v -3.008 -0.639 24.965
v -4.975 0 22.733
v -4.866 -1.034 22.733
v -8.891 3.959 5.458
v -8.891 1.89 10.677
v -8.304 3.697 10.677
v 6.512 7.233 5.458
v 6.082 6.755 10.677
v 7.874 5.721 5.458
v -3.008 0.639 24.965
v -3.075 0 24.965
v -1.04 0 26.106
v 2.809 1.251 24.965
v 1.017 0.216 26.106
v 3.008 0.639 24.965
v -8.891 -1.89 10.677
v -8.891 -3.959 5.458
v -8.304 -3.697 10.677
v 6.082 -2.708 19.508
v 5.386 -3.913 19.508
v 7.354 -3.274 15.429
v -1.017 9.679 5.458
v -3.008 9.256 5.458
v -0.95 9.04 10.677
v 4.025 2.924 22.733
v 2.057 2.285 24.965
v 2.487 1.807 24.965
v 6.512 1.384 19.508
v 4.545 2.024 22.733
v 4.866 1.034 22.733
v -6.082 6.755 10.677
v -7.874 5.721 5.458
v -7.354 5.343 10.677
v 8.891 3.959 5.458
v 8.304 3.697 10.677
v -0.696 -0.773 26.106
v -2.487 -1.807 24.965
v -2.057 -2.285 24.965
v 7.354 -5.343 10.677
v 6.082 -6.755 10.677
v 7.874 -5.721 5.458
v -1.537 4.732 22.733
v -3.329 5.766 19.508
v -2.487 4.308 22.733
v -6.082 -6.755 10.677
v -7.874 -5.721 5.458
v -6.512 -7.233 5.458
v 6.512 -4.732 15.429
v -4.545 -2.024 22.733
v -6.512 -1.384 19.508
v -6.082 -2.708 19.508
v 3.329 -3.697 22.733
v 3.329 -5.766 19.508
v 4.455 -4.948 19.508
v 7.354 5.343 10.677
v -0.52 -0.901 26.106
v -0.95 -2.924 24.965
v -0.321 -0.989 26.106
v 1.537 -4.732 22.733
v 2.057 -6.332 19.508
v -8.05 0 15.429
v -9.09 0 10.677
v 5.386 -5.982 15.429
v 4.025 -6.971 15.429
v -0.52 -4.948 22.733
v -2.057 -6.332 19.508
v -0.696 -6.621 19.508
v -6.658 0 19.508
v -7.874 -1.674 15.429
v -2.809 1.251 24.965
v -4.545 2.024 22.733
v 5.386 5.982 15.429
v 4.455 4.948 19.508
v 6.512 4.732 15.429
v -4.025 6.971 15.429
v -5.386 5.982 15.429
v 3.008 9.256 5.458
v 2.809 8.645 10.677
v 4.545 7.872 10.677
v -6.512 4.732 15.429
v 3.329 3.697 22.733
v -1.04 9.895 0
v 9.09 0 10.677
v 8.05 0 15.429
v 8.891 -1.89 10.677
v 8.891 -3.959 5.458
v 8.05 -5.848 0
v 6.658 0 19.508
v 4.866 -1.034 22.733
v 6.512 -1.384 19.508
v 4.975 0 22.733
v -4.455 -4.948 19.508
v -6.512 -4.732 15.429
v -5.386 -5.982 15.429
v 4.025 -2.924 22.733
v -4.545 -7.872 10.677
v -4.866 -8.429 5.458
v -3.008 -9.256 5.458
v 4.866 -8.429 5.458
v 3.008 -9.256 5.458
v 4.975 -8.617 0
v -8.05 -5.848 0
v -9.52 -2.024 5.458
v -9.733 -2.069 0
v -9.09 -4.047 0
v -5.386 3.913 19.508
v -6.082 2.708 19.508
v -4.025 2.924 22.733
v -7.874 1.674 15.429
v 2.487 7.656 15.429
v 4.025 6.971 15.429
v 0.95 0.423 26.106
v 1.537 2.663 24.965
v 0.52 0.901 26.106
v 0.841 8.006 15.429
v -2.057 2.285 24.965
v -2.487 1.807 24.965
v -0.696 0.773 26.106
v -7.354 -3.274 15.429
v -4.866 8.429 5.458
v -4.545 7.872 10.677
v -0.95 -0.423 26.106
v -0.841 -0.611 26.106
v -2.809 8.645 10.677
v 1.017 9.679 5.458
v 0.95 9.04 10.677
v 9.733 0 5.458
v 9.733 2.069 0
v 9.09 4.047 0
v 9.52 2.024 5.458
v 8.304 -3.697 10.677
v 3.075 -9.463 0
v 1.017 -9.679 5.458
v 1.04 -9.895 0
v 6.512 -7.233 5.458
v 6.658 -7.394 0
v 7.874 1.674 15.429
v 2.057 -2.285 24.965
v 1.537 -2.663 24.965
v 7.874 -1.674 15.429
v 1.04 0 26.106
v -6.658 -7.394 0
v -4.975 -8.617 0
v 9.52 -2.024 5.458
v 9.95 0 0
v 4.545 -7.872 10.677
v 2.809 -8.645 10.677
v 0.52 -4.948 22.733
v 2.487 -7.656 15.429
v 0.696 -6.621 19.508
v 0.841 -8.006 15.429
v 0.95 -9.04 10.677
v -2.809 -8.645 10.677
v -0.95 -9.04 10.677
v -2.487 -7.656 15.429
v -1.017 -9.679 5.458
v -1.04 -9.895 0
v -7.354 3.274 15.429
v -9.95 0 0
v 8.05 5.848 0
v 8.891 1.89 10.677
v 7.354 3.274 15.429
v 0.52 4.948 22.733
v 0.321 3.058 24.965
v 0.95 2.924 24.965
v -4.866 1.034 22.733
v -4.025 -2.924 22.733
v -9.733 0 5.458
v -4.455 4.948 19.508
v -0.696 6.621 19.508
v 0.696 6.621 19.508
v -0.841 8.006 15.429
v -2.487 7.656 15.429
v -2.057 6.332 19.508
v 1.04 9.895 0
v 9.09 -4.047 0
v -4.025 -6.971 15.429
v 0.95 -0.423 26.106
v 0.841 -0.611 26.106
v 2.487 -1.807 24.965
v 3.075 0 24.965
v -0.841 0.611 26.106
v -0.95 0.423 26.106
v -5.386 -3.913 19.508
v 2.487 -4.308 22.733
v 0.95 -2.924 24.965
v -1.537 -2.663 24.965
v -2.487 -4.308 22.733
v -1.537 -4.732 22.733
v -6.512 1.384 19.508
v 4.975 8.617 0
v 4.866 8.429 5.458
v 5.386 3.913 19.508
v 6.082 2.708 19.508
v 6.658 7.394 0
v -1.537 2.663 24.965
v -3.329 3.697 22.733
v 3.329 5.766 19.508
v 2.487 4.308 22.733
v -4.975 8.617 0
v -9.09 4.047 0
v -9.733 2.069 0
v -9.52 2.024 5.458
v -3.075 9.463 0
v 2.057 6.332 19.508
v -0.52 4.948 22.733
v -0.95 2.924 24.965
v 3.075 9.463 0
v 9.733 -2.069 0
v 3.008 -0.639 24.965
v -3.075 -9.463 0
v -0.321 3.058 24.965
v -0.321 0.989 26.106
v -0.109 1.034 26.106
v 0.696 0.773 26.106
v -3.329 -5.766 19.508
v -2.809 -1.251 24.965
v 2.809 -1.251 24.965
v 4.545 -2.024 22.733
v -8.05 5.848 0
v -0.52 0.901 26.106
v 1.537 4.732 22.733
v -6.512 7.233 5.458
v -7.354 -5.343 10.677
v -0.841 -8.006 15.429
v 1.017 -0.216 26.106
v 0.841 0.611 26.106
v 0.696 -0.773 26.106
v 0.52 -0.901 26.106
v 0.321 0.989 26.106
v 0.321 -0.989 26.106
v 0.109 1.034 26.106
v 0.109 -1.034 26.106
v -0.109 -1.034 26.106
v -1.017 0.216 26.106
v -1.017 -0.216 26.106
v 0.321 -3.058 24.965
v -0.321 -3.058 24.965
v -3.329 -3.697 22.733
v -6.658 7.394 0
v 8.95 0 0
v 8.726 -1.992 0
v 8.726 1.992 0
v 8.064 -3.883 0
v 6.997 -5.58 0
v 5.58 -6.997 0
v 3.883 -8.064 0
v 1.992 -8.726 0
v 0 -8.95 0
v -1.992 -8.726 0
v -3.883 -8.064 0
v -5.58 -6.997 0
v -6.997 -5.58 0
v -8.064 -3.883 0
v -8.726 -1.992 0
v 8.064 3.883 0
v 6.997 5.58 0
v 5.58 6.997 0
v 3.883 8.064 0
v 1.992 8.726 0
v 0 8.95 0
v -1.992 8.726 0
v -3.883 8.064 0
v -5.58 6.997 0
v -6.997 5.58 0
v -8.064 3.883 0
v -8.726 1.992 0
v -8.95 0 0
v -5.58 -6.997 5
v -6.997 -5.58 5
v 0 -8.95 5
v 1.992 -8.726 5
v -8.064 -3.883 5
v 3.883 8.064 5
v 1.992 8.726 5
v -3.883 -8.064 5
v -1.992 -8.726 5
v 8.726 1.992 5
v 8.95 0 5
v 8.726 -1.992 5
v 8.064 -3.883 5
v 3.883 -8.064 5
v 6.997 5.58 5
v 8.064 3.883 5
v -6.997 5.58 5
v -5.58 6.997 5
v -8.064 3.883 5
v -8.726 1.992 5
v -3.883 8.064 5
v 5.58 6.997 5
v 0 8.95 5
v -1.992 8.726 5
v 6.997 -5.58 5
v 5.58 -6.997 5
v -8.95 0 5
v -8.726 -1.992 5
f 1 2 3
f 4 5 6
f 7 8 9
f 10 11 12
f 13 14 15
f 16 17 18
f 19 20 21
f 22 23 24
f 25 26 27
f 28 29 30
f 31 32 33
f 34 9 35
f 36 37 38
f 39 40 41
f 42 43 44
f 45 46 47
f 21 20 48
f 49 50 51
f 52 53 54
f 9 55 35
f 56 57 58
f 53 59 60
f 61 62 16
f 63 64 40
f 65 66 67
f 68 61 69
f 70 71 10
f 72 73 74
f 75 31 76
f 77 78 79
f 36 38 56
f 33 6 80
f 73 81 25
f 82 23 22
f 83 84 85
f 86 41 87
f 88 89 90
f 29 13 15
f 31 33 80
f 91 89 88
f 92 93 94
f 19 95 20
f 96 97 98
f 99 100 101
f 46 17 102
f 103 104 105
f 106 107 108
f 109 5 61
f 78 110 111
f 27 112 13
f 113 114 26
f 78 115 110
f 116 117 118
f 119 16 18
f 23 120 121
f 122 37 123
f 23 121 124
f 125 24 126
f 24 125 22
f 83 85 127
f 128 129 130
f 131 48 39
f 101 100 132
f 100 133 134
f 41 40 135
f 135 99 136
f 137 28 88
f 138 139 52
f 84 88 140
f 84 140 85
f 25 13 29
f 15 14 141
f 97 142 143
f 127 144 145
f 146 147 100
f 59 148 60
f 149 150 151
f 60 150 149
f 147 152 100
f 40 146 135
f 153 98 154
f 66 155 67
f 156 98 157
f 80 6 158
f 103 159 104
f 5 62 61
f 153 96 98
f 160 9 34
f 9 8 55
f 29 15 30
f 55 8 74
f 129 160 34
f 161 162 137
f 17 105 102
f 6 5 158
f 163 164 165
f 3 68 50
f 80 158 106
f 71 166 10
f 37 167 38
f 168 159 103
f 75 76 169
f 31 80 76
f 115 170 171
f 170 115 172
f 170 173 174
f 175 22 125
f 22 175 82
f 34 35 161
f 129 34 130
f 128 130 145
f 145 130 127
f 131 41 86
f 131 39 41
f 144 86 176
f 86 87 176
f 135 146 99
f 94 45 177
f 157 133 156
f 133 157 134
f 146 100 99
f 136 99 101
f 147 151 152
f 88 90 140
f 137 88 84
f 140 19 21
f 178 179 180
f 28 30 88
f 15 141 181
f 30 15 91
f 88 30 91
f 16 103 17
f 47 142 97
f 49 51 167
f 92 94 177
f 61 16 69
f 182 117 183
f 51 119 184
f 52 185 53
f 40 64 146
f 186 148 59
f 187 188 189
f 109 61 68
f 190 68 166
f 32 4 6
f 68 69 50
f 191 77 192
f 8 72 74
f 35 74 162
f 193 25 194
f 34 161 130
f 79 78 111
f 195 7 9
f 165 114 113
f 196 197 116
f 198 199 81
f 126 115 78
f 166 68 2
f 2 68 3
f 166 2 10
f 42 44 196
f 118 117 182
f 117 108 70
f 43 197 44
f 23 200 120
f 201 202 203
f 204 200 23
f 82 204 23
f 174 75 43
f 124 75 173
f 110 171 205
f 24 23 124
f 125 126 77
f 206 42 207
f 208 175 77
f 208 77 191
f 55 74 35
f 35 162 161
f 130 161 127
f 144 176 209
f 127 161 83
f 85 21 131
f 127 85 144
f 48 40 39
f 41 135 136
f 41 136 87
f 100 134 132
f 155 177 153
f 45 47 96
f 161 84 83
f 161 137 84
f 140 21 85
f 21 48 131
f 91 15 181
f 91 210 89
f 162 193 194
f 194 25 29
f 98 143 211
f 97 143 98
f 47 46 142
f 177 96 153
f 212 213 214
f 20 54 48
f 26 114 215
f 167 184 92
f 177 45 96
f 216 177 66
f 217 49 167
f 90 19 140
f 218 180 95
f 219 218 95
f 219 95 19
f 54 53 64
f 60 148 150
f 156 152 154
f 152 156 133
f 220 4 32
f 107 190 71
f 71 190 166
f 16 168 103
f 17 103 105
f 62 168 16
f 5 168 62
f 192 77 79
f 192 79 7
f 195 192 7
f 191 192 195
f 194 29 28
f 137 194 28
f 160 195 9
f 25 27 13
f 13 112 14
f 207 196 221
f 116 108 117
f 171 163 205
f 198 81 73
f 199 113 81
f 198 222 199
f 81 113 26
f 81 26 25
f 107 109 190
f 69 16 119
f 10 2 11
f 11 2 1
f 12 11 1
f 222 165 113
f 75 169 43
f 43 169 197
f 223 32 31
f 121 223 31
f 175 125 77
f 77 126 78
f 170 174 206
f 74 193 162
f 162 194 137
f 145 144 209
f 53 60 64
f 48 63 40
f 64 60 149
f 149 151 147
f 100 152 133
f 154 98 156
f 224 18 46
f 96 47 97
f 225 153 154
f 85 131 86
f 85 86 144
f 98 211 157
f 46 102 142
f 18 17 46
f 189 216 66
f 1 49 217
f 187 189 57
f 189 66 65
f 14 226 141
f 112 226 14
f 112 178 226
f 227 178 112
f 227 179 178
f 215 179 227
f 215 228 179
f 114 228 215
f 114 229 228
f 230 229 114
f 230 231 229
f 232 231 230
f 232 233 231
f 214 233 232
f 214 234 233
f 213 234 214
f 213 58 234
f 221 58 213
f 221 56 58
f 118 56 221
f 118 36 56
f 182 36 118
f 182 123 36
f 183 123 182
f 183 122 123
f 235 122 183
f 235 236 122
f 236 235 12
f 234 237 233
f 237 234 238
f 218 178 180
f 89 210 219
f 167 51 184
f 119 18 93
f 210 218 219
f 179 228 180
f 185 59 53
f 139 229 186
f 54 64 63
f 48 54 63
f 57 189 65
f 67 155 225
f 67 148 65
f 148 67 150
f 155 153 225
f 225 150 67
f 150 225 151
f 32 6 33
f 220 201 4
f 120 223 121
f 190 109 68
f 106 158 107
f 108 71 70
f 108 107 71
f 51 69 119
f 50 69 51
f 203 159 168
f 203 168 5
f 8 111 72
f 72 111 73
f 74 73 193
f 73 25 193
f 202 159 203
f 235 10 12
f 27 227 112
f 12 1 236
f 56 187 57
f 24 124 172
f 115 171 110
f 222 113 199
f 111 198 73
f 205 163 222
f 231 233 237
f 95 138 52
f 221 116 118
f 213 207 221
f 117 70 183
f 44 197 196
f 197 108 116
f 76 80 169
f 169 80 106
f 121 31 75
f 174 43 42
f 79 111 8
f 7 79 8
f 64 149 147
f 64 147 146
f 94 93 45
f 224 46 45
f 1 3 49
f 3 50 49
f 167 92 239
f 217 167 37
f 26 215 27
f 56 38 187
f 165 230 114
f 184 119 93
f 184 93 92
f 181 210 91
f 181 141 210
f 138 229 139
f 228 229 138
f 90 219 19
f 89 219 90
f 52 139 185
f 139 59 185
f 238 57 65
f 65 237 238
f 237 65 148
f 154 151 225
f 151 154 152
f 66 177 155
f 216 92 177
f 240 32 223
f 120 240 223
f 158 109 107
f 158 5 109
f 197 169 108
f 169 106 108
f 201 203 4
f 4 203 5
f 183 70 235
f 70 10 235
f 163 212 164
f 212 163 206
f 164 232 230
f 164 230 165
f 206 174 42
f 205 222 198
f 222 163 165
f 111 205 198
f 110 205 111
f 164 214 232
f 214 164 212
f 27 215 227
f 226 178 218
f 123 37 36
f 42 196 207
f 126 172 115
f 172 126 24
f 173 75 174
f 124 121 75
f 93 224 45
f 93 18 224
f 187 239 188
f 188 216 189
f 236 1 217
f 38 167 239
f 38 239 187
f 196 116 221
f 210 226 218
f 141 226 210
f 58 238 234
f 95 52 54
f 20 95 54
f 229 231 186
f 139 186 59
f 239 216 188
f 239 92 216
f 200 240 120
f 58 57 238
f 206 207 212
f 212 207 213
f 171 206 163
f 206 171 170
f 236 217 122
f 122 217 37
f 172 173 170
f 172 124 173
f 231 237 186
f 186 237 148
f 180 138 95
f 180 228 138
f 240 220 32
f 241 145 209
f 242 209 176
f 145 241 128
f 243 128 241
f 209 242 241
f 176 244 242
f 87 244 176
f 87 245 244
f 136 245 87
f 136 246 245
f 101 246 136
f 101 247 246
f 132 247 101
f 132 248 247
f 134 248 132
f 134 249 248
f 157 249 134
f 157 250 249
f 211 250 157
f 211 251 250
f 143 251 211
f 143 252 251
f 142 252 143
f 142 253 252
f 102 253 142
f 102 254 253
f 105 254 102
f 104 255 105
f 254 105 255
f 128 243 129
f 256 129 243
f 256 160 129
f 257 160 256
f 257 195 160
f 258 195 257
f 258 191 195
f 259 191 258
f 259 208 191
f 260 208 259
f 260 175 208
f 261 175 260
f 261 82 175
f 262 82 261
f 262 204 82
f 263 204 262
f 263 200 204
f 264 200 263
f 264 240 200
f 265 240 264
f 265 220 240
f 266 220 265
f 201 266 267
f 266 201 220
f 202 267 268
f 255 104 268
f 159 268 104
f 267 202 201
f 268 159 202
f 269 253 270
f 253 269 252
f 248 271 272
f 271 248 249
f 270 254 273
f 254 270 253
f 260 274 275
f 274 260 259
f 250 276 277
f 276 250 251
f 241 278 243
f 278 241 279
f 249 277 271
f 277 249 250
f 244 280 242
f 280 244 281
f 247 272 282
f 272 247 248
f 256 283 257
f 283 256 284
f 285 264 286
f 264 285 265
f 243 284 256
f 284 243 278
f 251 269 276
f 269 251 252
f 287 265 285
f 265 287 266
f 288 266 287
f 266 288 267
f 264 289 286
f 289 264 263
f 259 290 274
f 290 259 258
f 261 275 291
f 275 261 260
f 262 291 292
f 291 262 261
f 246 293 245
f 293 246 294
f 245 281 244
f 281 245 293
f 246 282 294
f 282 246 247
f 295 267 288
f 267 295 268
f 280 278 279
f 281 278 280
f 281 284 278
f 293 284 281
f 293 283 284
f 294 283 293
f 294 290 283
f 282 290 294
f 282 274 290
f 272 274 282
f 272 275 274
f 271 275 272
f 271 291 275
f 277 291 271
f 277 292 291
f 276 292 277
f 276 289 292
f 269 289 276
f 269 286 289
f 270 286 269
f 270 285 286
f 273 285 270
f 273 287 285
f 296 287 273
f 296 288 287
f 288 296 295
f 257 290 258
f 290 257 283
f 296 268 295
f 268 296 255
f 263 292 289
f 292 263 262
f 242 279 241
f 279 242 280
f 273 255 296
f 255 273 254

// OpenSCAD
tol = 0.4;

engine_radius = 17.5 / 2;
engine_height = 70;

nose_assembly_height = 26.25;
nose_assembly_thickness = 1.2;
nose_assembly_slot_height = 5;
nose_assembly_radius = engine_radius + nose_assembly_thickness;

module with_tol(size) {
  resize(size + tol * [1, 1, 1]) {
    children();
  }
}

// chops off model on entire side of plane
module chop(r, plane) {
  difference() {
    children();

    theta = plane[0] == 0 ? 0 : atan(plane[1] / plane[0]);
    phi_abs = atan(sqrt(pow(plane[0], 2) + pow(plane[1], 2)) / plane[2]);
    phi_sign = plane[0] > 0 ? phi_abs : -phi_abs;
    phi = plane[2] >= 0 ? phi_sign : phi_sign + 180;
    
    // cut off below plane
    rotate([0, 0, theta])
      rotate([0, phi, 0])
        translate(-r * [0, 0, 1])
          //with_tol((2 * r) * [1, 1, 1])
            cube((2 * r) * [1, 1, 1], true);
  }
}

module a8_3_engine() {
  with_tol([engine_radius * 2, engine_radius * 2, engine_height]) {
    cylinder(engine_height, engine_radius, engine_radius);
  }
}

module parabolic_cone(height, radius) {
  chop(10, [0, 0, 1]) {
    scale([1, 1, height / radius]) {
      sphere(radius);
    }
  }
}

difference() {
  // the nose cone
  parabolic_cone(nose_assembly_height, nose_assembly_radius);

  translate([0, 0, nose_assembly_slot_height]) {
    mirror([0, 0, 1]) {
      // the engine
      // remove the '#' that was in front of the cylinder()
      a8_3_engine()

      // the inner dome
      sphere(engine_radius + tol);
    }
  }
}
